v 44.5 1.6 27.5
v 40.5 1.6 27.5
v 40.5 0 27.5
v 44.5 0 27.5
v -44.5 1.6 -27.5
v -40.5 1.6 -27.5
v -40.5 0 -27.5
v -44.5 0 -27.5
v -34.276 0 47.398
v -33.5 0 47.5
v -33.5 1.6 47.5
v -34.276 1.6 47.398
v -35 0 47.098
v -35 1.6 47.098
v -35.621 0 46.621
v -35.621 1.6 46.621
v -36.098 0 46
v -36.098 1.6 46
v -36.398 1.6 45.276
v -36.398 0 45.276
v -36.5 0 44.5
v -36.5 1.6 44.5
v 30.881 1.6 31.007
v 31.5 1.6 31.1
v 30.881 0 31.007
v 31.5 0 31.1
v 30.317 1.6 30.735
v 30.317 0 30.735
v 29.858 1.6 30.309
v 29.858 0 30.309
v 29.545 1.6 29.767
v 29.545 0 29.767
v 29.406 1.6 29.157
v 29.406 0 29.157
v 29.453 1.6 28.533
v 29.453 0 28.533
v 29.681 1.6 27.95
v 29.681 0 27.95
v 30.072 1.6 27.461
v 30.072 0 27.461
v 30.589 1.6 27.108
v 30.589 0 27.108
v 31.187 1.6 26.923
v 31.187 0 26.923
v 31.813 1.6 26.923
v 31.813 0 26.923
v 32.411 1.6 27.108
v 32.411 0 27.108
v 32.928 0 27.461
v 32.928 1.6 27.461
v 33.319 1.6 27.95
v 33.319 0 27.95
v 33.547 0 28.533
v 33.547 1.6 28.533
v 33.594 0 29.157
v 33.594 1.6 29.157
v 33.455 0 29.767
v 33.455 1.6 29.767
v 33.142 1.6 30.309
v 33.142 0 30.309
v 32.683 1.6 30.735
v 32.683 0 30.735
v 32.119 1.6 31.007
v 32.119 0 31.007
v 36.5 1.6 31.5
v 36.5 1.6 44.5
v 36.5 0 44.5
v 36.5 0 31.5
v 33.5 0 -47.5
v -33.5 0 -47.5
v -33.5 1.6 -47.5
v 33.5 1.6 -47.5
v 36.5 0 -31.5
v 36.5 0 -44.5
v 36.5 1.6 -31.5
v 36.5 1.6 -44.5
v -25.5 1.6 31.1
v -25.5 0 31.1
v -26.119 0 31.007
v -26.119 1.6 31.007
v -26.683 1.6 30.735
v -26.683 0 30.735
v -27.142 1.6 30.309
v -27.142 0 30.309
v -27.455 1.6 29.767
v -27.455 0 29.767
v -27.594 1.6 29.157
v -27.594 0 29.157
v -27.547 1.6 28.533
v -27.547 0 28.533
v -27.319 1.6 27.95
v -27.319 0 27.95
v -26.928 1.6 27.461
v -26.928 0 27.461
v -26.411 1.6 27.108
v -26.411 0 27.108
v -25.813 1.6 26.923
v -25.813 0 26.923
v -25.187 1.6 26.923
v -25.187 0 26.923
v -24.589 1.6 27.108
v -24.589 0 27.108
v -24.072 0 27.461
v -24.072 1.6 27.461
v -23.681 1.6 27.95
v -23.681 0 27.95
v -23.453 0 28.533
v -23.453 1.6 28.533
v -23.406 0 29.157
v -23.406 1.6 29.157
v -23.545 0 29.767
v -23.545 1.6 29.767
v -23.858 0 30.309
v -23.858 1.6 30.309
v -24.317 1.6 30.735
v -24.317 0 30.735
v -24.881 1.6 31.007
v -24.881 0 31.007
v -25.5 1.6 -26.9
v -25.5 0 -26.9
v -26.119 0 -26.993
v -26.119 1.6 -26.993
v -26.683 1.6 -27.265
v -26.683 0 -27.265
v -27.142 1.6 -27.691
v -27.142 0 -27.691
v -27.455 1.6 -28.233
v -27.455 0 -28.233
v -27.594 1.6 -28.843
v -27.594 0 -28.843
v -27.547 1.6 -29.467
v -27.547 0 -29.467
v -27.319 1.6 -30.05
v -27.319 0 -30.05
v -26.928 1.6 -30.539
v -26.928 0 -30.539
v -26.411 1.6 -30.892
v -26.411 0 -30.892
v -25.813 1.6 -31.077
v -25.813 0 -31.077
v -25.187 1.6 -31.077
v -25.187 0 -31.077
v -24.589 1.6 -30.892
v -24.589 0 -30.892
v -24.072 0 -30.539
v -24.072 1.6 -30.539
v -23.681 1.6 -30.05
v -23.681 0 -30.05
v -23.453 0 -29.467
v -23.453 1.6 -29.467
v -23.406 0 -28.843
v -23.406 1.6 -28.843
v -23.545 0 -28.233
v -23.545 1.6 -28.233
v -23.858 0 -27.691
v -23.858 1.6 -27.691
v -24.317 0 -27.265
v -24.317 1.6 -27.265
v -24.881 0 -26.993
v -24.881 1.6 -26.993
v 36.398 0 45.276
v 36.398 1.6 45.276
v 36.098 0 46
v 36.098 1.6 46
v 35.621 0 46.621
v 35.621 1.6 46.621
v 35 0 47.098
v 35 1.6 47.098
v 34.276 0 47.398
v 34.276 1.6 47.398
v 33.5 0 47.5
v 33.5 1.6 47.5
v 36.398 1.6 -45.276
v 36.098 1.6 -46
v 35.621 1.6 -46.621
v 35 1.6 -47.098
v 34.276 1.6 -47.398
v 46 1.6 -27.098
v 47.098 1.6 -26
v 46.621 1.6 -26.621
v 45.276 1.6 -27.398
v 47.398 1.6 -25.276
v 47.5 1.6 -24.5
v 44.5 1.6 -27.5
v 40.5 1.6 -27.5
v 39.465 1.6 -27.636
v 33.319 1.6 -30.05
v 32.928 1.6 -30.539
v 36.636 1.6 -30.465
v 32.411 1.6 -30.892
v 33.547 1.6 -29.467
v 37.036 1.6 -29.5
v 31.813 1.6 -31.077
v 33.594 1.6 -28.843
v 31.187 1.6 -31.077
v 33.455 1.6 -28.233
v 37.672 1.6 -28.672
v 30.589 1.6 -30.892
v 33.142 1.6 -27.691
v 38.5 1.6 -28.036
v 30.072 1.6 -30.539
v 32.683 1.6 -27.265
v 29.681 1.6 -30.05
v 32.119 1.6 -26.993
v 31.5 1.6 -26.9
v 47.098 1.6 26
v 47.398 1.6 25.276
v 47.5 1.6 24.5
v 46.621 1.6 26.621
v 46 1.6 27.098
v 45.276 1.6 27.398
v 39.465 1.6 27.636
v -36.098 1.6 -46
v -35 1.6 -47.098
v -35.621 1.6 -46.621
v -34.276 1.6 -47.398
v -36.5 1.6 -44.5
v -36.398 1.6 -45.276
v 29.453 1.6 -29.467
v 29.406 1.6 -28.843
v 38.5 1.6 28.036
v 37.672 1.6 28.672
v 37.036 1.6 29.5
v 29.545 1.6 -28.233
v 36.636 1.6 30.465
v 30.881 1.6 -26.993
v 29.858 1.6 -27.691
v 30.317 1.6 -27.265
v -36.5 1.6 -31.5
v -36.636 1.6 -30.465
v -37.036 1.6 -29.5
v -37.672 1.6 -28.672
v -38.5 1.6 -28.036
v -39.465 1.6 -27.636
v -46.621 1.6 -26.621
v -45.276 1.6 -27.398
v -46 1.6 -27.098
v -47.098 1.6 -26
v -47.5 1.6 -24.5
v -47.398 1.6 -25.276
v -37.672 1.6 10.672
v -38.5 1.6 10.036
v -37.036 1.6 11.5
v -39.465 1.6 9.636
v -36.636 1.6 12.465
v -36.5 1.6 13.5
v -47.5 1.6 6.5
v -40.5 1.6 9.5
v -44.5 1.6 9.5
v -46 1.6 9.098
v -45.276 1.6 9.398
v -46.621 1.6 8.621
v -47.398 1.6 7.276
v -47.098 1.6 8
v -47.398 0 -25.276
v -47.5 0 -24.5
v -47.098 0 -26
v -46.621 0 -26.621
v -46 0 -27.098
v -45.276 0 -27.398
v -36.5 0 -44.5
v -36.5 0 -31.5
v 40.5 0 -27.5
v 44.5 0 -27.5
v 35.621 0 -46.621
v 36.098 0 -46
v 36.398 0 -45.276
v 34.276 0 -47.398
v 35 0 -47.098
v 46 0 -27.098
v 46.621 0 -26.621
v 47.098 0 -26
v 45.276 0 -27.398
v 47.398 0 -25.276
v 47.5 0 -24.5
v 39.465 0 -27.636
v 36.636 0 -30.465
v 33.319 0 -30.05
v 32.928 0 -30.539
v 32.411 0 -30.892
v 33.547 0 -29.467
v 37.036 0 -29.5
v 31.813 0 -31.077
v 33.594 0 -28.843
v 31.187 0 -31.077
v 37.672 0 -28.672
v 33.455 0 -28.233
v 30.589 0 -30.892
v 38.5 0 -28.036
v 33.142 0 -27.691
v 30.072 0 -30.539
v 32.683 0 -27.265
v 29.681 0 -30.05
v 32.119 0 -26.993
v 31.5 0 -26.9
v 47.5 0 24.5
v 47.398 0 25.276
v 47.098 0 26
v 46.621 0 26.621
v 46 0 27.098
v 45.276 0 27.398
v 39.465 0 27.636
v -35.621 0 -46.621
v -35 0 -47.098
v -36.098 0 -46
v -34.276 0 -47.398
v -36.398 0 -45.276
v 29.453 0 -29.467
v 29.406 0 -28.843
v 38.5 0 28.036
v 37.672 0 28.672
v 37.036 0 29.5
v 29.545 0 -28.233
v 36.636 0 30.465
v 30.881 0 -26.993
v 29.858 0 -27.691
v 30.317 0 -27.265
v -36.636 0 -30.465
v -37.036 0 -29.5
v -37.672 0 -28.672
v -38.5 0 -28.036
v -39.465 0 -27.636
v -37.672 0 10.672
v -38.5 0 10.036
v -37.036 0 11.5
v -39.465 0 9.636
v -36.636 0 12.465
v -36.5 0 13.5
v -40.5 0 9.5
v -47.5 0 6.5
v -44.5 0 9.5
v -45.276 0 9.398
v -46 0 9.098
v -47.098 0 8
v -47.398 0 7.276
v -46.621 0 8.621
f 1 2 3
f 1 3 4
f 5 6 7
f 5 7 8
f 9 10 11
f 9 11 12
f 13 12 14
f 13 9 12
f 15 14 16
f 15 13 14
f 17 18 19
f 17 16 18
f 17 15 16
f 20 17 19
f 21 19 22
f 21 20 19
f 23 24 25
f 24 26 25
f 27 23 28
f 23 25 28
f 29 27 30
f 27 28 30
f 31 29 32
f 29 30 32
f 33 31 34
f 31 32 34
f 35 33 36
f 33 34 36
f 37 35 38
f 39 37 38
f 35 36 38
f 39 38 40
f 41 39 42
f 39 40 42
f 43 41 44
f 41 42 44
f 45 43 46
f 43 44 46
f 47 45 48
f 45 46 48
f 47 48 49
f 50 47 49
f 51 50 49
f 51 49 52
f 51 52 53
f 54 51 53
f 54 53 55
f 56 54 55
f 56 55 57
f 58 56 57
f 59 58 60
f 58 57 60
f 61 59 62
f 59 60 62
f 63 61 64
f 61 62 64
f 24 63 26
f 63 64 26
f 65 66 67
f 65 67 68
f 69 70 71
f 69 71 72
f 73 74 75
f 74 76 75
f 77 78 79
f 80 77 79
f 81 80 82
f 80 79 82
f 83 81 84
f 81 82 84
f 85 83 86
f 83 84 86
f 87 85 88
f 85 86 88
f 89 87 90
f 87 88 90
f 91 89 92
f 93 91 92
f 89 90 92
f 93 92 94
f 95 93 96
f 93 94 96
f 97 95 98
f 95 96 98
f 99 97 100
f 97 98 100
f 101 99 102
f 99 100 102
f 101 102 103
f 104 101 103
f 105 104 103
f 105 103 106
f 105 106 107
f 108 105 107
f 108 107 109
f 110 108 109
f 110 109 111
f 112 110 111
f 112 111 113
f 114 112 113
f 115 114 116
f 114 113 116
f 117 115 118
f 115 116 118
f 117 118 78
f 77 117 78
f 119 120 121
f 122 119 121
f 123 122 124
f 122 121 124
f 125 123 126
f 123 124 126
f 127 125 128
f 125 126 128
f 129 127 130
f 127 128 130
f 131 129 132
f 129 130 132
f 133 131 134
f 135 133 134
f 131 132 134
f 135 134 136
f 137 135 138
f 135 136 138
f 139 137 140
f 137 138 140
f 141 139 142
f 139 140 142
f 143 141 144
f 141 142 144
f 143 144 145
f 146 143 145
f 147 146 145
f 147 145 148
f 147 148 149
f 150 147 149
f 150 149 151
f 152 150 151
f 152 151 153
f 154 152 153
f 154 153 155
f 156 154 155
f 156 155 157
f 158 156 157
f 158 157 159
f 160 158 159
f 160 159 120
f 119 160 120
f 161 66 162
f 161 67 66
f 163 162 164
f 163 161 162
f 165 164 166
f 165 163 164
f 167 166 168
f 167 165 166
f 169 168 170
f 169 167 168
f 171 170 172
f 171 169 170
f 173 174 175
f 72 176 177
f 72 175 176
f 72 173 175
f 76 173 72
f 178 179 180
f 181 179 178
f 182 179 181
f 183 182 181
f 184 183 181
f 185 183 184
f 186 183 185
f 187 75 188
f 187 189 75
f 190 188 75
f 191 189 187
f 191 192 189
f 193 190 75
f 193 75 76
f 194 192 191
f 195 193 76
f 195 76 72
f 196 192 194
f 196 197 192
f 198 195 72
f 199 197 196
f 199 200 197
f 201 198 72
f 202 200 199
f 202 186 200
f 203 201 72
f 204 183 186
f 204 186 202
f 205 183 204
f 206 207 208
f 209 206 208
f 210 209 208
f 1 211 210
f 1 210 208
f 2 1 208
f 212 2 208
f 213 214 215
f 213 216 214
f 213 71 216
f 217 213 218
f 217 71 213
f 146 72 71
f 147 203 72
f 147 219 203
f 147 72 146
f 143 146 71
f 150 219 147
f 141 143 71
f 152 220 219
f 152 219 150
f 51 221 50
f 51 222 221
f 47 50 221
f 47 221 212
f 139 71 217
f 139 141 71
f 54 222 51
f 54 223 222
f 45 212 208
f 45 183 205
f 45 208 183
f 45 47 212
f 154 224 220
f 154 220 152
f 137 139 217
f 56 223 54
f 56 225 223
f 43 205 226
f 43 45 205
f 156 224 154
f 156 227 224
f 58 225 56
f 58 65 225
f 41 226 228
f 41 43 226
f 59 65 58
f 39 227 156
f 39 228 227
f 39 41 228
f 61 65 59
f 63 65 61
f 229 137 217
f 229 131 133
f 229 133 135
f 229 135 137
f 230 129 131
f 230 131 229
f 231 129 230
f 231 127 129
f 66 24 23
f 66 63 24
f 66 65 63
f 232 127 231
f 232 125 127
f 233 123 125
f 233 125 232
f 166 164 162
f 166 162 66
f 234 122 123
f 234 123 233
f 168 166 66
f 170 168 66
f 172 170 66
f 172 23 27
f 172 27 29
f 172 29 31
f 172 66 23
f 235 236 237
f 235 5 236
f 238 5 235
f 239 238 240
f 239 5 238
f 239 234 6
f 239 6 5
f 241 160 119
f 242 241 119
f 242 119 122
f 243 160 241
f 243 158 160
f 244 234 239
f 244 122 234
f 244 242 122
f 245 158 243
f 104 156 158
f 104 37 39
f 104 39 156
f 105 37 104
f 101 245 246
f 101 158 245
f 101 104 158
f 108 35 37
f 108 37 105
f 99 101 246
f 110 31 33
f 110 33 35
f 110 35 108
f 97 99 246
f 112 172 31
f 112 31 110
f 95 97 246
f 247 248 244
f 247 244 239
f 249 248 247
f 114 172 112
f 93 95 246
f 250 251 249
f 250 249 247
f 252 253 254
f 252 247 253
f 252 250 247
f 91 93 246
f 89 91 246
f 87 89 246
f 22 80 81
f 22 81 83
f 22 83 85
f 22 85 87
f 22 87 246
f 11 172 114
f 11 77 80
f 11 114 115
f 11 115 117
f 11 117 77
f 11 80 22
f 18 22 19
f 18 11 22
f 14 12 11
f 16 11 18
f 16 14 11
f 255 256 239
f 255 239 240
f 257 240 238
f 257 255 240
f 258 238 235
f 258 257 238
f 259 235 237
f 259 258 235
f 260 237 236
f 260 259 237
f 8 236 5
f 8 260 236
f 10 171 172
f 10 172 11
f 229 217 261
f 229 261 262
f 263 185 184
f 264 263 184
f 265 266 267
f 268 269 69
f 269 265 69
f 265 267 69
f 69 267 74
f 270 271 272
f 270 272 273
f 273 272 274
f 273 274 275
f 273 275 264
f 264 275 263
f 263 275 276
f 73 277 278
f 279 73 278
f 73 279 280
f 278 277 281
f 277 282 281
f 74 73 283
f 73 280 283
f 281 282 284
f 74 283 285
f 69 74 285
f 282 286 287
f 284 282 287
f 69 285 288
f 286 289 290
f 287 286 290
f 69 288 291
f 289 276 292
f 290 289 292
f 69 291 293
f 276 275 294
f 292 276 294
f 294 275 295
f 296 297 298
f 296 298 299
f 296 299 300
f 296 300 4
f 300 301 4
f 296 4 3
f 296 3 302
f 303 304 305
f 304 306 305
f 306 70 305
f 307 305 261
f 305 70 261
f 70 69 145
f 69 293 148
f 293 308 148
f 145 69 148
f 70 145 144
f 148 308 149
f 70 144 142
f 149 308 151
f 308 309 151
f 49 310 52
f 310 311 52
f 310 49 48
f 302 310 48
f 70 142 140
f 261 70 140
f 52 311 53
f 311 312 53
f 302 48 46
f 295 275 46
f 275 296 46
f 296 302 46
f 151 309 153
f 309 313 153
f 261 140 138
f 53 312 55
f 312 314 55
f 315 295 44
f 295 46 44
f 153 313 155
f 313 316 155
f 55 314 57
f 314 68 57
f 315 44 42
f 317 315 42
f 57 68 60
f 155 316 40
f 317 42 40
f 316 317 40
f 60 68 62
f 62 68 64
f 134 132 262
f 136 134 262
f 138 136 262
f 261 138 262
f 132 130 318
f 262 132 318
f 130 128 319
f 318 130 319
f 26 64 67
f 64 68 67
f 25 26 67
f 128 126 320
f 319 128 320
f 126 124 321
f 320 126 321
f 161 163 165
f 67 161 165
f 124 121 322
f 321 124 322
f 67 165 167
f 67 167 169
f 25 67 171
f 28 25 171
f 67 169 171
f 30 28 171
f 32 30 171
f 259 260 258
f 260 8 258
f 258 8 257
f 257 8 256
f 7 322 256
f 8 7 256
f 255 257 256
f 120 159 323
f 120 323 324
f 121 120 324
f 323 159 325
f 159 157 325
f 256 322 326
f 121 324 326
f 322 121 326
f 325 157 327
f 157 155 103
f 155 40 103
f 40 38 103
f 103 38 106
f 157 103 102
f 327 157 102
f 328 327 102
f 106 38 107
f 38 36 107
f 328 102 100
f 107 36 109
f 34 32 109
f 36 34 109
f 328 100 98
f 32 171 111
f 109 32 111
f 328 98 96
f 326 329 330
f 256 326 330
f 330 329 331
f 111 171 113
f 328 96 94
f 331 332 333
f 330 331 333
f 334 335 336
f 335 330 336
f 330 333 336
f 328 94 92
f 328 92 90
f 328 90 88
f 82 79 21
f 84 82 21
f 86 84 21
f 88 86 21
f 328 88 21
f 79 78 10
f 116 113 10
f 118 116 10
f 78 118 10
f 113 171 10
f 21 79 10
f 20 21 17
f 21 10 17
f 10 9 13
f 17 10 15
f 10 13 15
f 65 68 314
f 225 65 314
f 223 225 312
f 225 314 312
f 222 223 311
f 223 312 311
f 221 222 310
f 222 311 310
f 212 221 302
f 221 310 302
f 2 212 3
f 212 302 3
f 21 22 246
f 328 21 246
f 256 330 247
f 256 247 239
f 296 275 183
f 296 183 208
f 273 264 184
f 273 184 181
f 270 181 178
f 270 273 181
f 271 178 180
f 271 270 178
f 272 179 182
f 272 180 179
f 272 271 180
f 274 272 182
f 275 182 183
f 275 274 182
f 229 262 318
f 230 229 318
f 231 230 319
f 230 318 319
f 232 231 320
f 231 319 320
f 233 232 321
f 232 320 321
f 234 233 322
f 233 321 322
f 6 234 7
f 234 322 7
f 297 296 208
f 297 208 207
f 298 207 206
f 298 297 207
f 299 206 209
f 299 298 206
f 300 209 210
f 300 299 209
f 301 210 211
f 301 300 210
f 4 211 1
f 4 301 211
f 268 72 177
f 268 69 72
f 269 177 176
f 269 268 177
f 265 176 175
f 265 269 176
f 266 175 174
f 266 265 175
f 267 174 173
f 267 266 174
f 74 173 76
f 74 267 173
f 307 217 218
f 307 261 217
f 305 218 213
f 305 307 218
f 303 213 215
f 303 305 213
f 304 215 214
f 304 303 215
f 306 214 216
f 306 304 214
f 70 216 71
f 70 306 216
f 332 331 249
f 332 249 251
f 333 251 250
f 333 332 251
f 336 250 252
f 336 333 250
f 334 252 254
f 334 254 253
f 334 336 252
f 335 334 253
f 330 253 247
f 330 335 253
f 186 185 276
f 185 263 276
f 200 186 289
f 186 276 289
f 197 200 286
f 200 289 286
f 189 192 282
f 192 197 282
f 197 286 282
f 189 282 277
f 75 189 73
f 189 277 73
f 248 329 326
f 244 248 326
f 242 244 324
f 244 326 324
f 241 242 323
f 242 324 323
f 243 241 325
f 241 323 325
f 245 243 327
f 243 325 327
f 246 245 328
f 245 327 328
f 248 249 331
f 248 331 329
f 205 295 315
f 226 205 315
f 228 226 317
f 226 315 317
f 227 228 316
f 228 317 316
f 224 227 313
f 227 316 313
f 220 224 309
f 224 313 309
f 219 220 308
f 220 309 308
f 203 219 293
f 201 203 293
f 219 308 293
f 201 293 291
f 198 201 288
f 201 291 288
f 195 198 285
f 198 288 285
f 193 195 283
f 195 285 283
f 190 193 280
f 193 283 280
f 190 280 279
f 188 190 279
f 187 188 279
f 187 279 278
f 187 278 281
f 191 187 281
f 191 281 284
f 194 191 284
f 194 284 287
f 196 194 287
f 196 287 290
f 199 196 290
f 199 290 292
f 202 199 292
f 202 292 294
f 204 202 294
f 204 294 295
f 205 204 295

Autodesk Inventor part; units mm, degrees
ref_plane "YZ Plane" through (0, 0, 0) normal (1, 0, 0) x (0, 1, 0)
ref_plane "XZ Plane" through (0, 0, 0) normal (0, 1, 0) x (-1, 0, 0)
ref_plane "XY Plane" through (0, 0, 0) normal (0, 0, 1) x (1, 0, 0)
sketch "Sketch1" plane through (0, 0, 0) normal (0, 1, 0) x (-1, 0, 0)
  line L0 (-47.5, 47.5) -> (47.5, 47.5)
  line L1 (47.5, 47.5) -> (47.5, -47.5)
  line L2 (47.5, -47.5) -> (-47.5, -47.5)
  line L3 (-47.5, -47.5) -> (-47.5, 47.5)
  line L4 (-47.5, 47.5) -> (47.5, -47.5) construction
  line L5 (47.5, 47.5) -> (-47.5, -47.5) construction
  point P0 (0, 0)
  dimension "d0" = 95
  dimension "d1" = 95
extrude "Extrusion1" add sketch "Sketch1" along normal blind 1.6
sketch "Sketch4" plane through (0, 1.6, 0) normal (0, 1, 0) x (1, 0, 0)
  line L0 (-47.5, 47.5) -> (-47.5, -47.5) projected
  line L1 (-47.5, -47.5) -> (-36.5, -47.5)
  line L2 (-36.5, -47.5) -> (-36.5, -27.5)
  line L3 (-36.5, -27.5) -> (-47.5, -27.5)
  line L4 (-47.5, -27.5) -> (-47.5, -47.5)
  line L5 (-47.5, -47.5) -> (47.5, -47.5) projected
  line L6 (47.5, -47.5) -> (36.5, -47.5)
  line L7 (36.5, -47.5) -> (36.5, -27.5)
  line L8 (36.5, -27.5) -> (47.5, -27.5)
  line L9 (47.5, -27.5) -> (47.5, -47.5)
  line L10 (-47.5, 47.5) -> (-36.5, 47.5)
  line L11 (-36.5, 47.5) -> (-36.5, 27.5)
  line L12 (-36.5, 27.5) -> (-47.5, 27.5)
  line L13 (-47.5, 27.5) -> (-47.5, 47.5)
  line L14 (47.5, 47.5) -> (-47.5, 47.5) projected
  line L15 (47.5, 47.5) -> (36.5, 47.5)
  line L16 (36.5, 47.5) -> (36.5, 27.5)
  line L17 (36.5, 27.5) -> (47.5, 27.5)
  line L18 (47.5, 27.5) -> (47.5, 47.5)
  point P0 (0, 0)
  point P1 (-47.5, -27.5)
  point P2 (-47.5, 27.5)
  dimension "d18" = 11
  dimension "d19" = 20
  dimension "d21" = 20
  dimension "d22" = 11
  dimension "d23" = 11
  dimension "d24" = 20
  dimension "d25" = 11
  dimension "d26" = 20
extrude "Extrusion2" cut sketch "Sketch4" against normal blind 1.6
fillet "Fillet1" radius 4 4 edges at (36.5, 0.8, -27.5) (36.5, 0.8, 27.5) (-36.5, 0.8, 27.5) (-36.5, 0.8, -27.5)
fillet "Fillet2" radius 3 8 edges at (36.5, 0.8, 47.5) (-36.5, 0.8, 47.5) (-36.5, 0.8, -47.5) (36.5, 0.8, -47.5) (-47.5, 0.8, -27.5) (47.5, 0.8, -27.5) (47.5, 0.8, 27.5) (-47.5, 0.8, 27.5)
sketch "Sketch6" plane through (0, 1.6, 0) normal (0, 1, 0) x (1, 0, 0)
  line L0 (31.5, 29) -> (-25.5, 29) construction
  line L1 (-25.5, 29) -> (-25.5, -29) construction
  line L2 (-25.5, -29) -> (31.5, -29) construction
  line L3 (31.5, -29) -> (31.5, 29) construction
  line L4 (31.5, 29) -> (-25.5, -29) construction
  line L5 (-25.5, 29) -> (31.5, -29) construction
  line L6 (-66.5, 0) -> (66.5, 0) construction
  line L7 (0, 66.5) -> (0, -66.5) construction
  point P0 (3, 0)
  dimension "d31" = 57
  dimension "d32" = 58
  dimension "d41" = 3
hole "Hole2" at (-25.5, 1.6, 29) at (-25.5, 1.6, -29) at (31.5, 1.6, -29) at (31.5, 1.6, 29) direction (0, -1, 0) diameter 4.2 end through all
sketch "Sketch7" plane through (0, 1.6, 0) normal (0, 1, 0) x (1, 0, 0)
  line L0 (-47.5, 24.5) -> (-47.5, -24.5) projected
  line L1 (-36.5, -31.5) -> (-47.5, -31.5)
  line L2 (-47.5, -31.5) -> (-47.5, -9.5)
  line L3 (-47.5, -9.5) -> (-36.5, -9.5)
  line L4 (-36.5, -9.5) -> (-36.5, -31.5)
  point P0 (0, 0)
  dimension "d45" = 22
extrude "Extrusion3" cut sketch "Sketch7" against normal blind 10
fillet "Fillet3" radius 3 1 edges at (-47.5, 0.8, 9.5)
fillet "Fillet4" radius 4 1 edges at (-36.5, 0.8, 9.5)
equation "\"d19\" = d21"
equation "\"d22\" = d18"
equation "\"d23\" = d18"
equation "\"d24\" = d19"
equation "\"d25\" = d18"
equation "\"d26\" = d21"
properties part number "pcbIO"
